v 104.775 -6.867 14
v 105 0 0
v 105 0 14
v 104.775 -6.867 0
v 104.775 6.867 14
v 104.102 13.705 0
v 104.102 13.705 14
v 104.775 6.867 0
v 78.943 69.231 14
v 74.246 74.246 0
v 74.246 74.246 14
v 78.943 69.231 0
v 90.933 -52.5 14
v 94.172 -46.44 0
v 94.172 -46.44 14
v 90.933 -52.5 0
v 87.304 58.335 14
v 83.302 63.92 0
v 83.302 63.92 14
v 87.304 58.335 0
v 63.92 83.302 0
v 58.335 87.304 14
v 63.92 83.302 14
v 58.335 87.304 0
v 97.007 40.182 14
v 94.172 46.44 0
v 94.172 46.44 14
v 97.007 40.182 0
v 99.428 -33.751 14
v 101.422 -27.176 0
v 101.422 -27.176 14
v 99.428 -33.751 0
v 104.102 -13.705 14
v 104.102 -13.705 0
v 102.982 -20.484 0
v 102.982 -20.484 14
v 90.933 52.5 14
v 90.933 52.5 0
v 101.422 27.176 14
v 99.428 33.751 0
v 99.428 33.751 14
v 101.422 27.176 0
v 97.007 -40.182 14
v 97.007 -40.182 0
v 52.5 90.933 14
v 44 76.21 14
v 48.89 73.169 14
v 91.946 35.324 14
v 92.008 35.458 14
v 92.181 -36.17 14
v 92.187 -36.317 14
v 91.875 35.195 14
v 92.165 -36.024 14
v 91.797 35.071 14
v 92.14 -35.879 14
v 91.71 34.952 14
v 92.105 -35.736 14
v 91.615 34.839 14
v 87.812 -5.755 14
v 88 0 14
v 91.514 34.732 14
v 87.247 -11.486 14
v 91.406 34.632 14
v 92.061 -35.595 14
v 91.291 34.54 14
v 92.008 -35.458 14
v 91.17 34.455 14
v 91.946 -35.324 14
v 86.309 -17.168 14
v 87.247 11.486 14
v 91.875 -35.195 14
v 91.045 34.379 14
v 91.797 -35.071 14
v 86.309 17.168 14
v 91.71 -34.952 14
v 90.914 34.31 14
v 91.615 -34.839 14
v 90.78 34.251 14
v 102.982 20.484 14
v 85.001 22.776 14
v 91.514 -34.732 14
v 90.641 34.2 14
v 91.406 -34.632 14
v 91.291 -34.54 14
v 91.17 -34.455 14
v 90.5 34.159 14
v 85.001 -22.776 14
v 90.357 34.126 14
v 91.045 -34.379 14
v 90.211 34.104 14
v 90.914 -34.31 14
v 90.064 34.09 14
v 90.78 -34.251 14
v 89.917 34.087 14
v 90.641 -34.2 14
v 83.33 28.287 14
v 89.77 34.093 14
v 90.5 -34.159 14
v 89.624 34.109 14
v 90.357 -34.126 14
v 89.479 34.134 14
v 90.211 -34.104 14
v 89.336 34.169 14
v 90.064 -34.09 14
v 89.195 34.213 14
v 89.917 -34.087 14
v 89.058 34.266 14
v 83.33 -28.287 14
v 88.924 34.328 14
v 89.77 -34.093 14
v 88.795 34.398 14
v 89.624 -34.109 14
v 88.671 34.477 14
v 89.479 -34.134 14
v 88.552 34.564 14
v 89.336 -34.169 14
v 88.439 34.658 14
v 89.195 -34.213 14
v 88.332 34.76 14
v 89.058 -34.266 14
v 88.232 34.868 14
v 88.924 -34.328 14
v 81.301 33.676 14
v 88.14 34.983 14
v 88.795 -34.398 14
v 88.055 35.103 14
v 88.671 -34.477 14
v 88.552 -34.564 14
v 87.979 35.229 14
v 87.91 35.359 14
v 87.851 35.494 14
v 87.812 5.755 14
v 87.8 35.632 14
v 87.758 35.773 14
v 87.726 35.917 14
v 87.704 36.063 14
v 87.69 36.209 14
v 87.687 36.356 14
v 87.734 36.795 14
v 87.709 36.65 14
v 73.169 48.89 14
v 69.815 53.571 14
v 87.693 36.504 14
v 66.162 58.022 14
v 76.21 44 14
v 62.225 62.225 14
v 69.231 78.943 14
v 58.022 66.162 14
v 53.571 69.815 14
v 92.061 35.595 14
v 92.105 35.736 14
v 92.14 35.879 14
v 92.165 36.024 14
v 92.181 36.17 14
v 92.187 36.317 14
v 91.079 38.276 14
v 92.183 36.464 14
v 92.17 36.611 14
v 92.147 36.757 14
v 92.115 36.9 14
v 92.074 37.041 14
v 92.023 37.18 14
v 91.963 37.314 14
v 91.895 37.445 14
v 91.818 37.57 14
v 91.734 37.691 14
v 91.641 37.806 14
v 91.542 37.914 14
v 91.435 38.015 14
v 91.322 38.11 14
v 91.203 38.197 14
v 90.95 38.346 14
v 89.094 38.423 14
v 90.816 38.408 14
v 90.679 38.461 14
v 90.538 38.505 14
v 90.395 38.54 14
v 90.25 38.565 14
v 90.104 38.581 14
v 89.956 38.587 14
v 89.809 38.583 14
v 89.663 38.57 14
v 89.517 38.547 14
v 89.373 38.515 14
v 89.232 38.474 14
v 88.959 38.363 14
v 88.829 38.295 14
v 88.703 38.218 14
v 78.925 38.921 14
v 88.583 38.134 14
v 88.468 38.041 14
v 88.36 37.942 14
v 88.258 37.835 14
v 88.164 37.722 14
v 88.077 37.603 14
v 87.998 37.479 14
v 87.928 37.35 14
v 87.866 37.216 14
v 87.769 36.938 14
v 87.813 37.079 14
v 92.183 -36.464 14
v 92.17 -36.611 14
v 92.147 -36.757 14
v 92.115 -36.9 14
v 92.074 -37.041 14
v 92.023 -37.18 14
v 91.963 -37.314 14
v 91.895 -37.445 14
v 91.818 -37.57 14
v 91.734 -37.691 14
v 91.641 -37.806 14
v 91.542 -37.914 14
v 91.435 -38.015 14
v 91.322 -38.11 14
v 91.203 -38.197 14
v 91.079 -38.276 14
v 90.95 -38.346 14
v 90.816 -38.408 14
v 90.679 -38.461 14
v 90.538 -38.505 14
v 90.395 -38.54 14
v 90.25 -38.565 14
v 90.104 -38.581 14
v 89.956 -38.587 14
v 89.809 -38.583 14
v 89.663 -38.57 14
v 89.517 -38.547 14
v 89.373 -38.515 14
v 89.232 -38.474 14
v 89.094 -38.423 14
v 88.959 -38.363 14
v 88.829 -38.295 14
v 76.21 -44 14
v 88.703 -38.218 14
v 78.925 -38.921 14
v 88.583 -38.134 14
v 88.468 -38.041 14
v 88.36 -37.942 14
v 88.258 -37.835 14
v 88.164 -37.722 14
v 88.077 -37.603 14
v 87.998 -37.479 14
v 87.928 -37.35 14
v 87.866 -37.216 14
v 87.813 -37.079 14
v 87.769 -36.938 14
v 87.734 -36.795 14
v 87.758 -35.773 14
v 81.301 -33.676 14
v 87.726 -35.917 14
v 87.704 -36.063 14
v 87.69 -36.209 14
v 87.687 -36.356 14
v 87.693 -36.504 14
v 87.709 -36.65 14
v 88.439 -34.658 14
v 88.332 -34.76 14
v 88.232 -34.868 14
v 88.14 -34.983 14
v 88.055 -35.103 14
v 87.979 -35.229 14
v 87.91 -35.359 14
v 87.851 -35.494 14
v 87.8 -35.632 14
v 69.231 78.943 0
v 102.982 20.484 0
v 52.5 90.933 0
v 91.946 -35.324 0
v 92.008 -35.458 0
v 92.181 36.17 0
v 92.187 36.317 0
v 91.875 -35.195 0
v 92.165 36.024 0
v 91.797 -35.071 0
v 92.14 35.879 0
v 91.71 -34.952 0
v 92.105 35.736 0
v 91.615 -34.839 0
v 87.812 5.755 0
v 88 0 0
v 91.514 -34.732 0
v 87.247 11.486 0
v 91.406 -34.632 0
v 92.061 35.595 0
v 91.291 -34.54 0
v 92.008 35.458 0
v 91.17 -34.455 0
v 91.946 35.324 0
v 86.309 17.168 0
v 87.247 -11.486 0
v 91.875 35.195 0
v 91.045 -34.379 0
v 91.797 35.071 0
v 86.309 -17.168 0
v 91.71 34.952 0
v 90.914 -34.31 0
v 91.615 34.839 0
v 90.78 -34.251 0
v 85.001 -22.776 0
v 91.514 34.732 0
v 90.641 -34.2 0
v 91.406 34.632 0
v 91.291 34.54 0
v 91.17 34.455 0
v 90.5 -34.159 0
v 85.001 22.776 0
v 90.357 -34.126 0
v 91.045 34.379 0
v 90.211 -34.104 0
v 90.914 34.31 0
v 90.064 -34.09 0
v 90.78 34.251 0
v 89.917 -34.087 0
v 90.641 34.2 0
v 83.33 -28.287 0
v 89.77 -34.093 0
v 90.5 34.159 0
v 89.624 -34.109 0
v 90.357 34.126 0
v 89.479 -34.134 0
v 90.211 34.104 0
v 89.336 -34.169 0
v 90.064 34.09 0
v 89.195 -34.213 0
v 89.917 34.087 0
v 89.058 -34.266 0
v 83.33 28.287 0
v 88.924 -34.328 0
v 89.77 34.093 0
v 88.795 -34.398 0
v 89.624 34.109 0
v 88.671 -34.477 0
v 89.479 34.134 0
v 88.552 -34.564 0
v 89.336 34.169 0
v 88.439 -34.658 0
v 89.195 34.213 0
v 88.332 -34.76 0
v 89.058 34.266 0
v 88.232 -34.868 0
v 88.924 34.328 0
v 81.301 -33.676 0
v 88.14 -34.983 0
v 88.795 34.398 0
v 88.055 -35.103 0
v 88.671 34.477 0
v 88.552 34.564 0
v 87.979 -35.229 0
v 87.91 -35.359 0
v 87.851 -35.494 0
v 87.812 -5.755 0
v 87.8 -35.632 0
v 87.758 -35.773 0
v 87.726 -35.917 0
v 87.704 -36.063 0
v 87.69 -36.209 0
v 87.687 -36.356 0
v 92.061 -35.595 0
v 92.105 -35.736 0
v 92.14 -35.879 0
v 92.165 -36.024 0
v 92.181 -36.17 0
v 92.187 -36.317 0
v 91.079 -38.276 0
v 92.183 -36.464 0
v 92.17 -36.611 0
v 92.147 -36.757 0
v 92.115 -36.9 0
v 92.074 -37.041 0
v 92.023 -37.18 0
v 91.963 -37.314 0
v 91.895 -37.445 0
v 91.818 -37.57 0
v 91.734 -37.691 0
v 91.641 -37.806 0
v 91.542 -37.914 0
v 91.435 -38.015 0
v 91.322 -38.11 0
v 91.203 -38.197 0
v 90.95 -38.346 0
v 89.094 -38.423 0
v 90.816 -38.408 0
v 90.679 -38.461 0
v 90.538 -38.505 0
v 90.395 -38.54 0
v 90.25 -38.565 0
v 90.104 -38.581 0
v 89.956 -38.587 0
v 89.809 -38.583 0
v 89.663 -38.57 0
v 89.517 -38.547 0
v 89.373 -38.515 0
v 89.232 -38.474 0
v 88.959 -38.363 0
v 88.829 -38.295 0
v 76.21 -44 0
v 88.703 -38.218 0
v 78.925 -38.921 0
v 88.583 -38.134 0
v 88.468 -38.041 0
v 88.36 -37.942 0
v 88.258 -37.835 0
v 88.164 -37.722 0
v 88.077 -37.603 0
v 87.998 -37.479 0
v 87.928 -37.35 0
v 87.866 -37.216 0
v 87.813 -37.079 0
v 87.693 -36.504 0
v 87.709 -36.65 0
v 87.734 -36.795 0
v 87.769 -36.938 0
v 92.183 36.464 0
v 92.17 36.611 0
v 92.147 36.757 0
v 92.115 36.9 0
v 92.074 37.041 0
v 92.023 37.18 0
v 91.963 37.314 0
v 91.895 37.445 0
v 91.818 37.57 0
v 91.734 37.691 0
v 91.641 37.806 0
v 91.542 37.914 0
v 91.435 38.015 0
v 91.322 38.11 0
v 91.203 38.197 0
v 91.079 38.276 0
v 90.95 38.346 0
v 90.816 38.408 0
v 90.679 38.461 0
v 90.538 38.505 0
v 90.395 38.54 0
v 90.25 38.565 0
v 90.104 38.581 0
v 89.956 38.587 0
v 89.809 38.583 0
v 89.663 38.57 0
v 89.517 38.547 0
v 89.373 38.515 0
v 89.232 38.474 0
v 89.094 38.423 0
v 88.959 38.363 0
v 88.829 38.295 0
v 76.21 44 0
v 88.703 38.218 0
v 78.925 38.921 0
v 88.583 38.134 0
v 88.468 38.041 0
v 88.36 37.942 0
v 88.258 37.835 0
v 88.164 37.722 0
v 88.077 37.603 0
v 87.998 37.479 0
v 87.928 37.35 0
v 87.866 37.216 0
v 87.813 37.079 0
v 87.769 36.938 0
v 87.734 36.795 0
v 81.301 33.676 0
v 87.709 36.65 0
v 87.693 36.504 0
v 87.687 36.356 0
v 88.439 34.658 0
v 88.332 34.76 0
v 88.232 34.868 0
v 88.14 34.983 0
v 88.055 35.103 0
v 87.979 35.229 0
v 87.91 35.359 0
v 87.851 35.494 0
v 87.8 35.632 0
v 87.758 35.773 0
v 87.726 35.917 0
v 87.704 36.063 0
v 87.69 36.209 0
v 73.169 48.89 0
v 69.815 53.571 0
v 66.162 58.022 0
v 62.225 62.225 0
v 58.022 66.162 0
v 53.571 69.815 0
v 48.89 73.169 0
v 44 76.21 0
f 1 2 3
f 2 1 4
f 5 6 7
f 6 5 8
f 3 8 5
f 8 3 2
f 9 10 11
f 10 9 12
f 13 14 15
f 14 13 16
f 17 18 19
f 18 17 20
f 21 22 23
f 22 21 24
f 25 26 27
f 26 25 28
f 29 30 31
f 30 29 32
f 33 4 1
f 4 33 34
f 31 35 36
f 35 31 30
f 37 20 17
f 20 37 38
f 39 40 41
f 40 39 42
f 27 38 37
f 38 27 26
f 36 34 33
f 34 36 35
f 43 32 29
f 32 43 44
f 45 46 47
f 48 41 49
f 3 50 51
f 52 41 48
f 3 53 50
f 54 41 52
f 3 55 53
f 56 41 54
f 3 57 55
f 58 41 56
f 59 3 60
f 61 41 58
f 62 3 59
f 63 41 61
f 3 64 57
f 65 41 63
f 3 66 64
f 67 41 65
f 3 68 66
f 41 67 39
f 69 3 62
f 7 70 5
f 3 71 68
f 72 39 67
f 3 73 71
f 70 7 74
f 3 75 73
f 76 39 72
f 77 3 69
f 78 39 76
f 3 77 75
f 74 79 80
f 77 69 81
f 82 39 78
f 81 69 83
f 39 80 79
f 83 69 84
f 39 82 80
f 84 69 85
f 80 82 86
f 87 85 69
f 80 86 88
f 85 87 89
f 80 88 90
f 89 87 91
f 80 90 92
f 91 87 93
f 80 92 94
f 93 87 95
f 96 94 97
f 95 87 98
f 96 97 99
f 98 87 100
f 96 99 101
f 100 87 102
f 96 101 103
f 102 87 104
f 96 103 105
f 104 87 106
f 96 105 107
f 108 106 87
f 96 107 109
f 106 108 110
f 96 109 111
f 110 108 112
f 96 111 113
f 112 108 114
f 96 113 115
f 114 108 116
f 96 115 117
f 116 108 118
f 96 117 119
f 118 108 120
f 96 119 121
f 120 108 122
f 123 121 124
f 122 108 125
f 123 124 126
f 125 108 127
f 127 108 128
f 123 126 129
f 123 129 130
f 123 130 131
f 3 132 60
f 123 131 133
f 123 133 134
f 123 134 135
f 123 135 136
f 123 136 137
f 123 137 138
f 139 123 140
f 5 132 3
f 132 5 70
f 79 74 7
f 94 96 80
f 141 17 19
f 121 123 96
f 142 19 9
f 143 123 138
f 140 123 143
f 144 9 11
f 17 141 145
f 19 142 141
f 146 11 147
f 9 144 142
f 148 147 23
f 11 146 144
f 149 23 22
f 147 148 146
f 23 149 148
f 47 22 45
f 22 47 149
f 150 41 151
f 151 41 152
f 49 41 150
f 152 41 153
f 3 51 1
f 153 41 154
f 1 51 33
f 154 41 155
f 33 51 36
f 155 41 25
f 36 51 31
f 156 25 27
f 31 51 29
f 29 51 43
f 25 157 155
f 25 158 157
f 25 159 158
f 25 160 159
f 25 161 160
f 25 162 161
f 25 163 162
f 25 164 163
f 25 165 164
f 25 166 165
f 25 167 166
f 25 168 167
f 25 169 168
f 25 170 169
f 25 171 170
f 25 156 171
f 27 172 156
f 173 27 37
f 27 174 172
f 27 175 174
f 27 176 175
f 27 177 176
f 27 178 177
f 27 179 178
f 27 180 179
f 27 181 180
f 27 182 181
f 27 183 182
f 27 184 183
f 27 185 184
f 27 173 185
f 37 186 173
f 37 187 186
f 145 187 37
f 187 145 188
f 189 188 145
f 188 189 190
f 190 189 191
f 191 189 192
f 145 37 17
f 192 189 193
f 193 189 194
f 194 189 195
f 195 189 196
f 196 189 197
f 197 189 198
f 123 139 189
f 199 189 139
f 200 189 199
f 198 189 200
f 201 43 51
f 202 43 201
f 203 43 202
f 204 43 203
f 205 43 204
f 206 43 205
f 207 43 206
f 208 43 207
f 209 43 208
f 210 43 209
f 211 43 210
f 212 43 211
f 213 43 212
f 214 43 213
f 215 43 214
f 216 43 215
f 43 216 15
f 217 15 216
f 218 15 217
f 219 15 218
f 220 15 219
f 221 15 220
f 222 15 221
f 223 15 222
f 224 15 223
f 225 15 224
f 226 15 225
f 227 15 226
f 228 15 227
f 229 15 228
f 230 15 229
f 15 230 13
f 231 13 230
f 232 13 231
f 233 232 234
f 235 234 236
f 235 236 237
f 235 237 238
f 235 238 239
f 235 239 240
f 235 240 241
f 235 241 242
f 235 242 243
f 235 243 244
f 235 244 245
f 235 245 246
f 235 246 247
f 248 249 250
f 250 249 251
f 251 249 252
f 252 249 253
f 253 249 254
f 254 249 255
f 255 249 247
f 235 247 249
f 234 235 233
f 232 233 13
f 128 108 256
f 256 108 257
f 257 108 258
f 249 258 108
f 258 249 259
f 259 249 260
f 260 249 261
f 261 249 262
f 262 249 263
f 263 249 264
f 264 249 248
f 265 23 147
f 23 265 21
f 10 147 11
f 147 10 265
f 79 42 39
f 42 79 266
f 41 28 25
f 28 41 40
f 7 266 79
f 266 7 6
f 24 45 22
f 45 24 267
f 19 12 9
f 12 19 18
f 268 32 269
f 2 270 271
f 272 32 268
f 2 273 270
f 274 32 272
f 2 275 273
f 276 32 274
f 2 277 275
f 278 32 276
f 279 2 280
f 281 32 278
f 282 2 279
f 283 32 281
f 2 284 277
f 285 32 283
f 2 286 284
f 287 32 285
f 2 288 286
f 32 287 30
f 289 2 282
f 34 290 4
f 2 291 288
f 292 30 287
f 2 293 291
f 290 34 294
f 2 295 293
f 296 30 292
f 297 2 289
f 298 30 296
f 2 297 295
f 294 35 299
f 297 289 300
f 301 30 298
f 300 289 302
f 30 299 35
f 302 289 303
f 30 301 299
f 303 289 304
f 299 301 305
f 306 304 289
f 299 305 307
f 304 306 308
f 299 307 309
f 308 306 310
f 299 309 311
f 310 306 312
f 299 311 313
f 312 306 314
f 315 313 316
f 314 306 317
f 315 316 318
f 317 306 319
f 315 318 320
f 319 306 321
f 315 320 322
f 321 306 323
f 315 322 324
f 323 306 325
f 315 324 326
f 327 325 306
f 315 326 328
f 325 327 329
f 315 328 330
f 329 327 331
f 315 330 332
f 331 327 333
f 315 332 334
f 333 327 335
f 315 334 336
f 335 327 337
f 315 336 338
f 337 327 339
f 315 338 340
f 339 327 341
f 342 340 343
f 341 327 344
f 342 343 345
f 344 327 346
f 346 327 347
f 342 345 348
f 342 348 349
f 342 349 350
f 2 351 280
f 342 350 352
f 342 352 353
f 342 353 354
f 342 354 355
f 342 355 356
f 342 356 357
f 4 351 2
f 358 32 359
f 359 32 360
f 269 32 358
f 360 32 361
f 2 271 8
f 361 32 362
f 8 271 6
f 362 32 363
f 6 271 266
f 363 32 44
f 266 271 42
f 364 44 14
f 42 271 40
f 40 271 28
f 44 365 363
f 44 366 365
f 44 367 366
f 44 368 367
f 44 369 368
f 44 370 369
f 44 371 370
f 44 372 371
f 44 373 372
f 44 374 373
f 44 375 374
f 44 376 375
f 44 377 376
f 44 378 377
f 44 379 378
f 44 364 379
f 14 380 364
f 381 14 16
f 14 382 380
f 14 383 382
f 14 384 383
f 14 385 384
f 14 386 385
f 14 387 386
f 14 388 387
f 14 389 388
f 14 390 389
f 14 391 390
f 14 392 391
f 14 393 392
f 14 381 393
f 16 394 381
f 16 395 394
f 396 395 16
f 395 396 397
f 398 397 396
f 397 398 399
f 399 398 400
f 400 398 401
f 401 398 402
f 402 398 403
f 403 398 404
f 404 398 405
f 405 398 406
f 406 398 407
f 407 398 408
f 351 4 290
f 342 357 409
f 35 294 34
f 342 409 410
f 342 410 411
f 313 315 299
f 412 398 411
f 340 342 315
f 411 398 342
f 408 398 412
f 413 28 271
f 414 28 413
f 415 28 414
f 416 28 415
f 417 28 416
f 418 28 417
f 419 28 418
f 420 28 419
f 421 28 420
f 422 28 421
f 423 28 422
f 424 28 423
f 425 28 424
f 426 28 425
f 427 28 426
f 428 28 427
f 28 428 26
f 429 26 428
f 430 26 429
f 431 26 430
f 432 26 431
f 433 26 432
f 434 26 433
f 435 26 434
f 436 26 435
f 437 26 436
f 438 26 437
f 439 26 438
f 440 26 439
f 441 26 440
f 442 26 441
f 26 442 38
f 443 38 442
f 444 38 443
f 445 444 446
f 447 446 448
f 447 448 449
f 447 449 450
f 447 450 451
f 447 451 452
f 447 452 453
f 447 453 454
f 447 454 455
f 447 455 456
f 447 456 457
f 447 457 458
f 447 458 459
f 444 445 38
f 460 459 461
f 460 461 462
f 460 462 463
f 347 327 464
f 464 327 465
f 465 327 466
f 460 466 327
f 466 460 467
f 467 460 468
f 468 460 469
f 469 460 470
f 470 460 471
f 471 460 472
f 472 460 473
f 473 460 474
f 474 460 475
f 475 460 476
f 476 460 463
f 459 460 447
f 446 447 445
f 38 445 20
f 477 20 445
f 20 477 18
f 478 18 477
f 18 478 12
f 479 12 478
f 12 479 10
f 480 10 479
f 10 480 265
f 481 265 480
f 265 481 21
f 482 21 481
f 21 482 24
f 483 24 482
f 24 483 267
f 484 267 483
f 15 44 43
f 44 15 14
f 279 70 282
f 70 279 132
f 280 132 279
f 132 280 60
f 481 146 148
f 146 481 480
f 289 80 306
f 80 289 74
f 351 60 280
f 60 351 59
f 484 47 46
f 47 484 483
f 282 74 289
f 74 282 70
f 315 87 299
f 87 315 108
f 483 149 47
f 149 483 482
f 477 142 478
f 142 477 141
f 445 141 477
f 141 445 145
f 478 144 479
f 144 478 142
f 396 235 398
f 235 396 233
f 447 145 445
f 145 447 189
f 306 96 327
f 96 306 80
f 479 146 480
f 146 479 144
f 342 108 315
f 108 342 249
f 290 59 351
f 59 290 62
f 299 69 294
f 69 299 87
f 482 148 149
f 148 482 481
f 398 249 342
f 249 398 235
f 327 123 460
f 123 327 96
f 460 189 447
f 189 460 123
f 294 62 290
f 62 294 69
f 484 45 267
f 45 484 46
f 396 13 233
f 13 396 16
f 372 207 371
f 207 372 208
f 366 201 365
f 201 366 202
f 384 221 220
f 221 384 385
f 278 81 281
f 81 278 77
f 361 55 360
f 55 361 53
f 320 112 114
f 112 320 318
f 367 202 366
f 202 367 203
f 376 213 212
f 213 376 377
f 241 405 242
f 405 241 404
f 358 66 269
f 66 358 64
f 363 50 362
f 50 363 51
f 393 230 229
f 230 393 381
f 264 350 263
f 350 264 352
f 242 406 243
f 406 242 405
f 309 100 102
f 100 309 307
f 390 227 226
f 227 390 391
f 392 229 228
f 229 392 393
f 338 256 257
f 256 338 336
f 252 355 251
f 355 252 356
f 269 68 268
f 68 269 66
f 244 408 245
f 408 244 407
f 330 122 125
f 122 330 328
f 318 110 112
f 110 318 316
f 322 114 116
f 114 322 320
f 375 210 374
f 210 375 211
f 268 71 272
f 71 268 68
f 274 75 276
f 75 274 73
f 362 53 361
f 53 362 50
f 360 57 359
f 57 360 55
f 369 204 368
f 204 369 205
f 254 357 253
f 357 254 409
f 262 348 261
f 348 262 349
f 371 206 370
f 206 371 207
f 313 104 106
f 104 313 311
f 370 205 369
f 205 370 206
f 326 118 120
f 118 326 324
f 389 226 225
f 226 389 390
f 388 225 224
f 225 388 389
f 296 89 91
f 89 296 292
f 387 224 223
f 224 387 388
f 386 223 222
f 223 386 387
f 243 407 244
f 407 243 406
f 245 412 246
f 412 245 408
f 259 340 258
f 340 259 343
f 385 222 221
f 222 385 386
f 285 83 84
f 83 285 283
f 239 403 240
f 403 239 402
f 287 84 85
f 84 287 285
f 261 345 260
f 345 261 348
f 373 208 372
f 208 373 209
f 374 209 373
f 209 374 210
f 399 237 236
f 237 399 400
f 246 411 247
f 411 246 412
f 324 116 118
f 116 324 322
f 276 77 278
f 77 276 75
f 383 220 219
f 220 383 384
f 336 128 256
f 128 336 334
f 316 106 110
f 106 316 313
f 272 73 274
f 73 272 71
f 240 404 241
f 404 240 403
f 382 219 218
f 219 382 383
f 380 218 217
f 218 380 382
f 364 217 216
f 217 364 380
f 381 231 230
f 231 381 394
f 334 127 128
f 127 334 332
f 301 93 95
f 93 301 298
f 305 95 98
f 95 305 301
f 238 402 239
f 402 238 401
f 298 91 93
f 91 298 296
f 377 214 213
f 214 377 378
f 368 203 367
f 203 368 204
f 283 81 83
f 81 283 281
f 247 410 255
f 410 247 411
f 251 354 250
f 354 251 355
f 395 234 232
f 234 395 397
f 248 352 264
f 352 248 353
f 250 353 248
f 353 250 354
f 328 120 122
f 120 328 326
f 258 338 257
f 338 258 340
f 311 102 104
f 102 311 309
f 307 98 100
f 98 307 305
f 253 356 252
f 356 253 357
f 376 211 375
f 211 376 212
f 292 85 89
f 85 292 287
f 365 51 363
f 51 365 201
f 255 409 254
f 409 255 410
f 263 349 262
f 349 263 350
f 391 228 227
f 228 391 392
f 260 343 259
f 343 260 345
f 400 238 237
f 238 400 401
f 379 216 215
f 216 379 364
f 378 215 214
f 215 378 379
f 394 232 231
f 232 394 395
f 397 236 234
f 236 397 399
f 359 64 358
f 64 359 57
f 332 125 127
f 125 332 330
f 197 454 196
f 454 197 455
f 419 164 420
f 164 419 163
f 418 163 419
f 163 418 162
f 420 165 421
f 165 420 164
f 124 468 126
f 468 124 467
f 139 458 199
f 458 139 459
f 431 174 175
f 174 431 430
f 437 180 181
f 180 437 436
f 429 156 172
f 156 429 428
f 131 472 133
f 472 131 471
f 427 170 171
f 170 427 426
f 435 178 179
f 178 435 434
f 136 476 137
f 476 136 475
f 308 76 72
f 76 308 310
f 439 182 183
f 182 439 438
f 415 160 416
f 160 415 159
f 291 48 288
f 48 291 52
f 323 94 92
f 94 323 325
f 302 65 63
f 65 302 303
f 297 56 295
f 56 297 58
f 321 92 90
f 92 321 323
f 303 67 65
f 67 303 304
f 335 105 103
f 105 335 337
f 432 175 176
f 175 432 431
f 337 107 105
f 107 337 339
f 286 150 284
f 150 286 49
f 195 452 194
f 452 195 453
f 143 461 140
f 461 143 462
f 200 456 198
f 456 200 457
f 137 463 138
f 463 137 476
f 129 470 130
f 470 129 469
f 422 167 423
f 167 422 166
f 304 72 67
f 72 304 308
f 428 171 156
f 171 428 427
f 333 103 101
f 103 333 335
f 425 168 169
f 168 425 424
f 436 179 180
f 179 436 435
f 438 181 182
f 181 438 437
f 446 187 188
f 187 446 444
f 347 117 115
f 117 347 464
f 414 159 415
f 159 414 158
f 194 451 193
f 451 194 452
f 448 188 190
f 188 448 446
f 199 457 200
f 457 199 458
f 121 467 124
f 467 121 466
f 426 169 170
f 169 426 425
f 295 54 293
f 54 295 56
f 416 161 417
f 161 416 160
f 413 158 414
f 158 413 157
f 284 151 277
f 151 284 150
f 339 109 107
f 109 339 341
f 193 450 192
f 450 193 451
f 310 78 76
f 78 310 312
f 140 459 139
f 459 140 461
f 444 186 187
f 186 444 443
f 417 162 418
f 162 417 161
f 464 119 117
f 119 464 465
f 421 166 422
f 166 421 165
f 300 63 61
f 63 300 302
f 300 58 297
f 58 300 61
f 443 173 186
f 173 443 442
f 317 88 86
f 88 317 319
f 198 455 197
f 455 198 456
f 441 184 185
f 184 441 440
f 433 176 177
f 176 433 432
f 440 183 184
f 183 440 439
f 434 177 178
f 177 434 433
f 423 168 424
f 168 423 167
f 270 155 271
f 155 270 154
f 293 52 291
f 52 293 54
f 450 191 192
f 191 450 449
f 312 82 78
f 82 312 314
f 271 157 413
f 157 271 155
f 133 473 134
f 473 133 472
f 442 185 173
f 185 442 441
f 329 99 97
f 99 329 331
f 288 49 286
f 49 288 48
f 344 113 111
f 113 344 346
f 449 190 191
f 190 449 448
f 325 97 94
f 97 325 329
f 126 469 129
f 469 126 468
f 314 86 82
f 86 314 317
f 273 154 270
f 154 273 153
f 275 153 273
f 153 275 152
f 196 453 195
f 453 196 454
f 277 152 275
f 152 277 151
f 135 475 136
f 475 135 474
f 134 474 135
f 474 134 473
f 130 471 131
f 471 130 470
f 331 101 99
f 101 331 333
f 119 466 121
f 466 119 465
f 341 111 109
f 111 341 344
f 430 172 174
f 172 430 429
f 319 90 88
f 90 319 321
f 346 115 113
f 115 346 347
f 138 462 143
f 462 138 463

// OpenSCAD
// CYD Satellite Tracker — printable AZ guide-ring segment
// Prototype segment only. Print multiple segments and join on a rigid metal/plywood base.
// Not a bearing race; use rated rollers/bearings and calculate wind loads.
$fn=96;
outer_r=105; inner_r=88; height=14;
segment_angle=60; bolt_d=4.5; bolt_circle_r=97;
module ring_sector(){
  difference(){
    intersection(){
      difference(){
        cylinder(h=height,r=outer_r);
        translate([0,0,-0.1]) cylinder(h=height+0.2,r=inner_r);
      }
      rotate([0,0,-segment_angle/2])
        linear_extrude(height=height)
          polygon(points=[[0,0],[outer_r*1.2,0],[outer_r*1.2*tan(segment_angle),outer_r*1.2],[0,outer_r*1.2]]);
    }
    for(a=[-segment_angle/2+8,segment_angle/2-8])
      rotate([0,0,a]) translate([bolt_circle_r,0,-0.1])
        cylinder(h=height+0.2,d=bolt_d);
  }
}
ring_sector();
